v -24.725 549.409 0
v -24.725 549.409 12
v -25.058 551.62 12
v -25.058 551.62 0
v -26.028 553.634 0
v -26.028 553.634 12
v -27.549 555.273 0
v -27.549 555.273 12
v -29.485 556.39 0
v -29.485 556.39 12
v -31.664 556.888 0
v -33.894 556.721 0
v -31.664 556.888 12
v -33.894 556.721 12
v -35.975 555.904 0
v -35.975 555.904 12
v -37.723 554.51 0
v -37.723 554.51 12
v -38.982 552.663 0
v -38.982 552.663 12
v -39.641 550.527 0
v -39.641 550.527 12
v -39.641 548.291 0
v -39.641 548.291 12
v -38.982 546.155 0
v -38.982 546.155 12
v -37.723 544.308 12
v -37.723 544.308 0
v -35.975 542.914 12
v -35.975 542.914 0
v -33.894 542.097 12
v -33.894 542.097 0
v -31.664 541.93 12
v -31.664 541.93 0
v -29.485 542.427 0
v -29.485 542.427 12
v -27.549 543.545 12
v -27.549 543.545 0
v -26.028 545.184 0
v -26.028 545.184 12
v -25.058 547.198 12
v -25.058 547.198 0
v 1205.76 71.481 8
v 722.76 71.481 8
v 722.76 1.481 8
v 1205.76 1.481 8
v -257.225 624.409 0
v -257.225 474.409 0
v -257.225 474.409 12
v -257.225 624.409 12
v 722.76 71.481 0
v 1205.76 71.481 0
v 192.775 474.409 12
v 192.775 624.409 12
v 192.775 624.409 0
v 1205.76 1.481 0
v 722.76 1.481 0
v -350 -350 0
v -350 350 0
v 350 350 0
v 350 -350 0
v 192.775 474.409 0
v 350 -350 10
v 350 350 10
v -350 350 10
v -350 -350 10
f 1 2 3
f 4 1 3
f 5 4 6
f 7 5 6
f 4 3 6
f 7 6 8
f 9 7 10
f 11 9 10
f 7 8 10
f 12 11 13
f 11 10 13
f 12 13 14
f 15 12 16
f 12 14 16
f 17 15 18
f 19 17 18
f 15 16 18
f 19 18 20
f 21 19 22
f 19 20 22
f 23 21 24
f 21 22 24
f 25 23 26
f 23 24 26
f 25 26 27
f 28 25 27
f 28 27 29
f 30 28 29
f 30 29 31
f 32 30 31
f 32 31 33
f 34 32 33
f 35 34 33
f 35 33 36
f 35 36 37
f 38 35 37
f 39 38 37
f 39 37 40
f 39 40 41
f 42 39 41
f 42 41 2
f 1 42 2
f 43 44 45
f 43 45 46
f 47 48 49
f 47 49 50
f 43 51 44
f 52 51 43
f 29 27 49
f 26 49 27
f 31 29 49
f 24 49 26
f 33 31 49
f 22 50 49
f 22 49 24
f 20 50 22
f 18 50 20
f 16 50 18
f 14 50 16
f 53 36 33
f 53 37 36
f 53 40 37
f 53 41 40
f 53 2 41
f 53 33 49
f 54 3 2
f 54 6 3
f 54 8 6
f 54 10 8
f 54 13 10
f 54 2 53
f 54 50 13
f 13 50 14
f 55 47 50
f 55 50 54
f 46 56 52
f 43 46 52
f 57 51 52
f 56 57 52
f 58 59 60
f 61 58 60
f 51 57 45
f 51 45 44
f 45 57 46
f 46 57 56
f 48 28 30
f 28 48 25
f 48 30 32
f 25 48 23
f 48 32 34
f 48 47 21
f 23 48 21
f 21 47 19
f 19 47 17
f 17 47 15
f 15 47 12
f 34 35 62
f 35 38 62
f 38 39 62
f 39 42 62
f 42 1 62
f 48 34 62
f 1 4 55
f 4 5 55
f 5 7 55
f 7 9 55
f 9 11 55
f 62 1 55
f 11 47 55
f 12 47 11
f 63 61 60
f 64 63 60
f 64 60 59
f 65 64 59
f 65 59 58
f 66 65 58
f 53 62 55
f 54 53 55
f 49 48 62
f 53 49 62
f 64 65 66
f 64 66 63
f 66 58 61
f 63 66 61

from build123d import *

# Parameters (mm, degrees)
F1_DEPTH = 10
F2_W     = 483
F2_H     = 70
F3_DEPTH = 8
F4_W     = 450
F4_H     = 150
F5_DEPTH = 12
F6_R     = 7.5
F7_DEPTH = 12.001


with BuildPart() as f1:
    # F0 (on Top) → F1 (new body)
    with BuildSketch(Plane.XY):
        Polygon((350, -350), (-350, 350), (-350, -350), align=None)
        Polygon((350, 350), (-350, 350), (350, -350), align=None)
    extrude(amount=F1_DEPTH)


with BuildPart() as f3:
    # F2 (on Top) → F3 (new body)
    with BuildSketch(Plane.XY):
        with Locations((964.260379, 36.481202)):
            Rectangle(F2_W, F2_H)
    extrude(amount=F3_DEPTH)


with BuildPart() as f5:
    # F4 (on Top) → F5 (new body)
    with BuildSketch(Plane.XY):
        with Locations((-32.22473, 549.408846)):
            Rectangle(F4_W, F4_H)
    extrude(amount=F5_DEPTH)

    # F6 (on face) → F7 (cut, through all)
    with BuildSketch(Plane.XY.offset(12)):
        with Locations((-32.22473, 549.408846)):
            Circle(F6_R)
    extrude(amount=-F7_DEPTH, mode=Mode.SUBTRACT)


solid = Compound([f1.part, f3.part, f5.part])
